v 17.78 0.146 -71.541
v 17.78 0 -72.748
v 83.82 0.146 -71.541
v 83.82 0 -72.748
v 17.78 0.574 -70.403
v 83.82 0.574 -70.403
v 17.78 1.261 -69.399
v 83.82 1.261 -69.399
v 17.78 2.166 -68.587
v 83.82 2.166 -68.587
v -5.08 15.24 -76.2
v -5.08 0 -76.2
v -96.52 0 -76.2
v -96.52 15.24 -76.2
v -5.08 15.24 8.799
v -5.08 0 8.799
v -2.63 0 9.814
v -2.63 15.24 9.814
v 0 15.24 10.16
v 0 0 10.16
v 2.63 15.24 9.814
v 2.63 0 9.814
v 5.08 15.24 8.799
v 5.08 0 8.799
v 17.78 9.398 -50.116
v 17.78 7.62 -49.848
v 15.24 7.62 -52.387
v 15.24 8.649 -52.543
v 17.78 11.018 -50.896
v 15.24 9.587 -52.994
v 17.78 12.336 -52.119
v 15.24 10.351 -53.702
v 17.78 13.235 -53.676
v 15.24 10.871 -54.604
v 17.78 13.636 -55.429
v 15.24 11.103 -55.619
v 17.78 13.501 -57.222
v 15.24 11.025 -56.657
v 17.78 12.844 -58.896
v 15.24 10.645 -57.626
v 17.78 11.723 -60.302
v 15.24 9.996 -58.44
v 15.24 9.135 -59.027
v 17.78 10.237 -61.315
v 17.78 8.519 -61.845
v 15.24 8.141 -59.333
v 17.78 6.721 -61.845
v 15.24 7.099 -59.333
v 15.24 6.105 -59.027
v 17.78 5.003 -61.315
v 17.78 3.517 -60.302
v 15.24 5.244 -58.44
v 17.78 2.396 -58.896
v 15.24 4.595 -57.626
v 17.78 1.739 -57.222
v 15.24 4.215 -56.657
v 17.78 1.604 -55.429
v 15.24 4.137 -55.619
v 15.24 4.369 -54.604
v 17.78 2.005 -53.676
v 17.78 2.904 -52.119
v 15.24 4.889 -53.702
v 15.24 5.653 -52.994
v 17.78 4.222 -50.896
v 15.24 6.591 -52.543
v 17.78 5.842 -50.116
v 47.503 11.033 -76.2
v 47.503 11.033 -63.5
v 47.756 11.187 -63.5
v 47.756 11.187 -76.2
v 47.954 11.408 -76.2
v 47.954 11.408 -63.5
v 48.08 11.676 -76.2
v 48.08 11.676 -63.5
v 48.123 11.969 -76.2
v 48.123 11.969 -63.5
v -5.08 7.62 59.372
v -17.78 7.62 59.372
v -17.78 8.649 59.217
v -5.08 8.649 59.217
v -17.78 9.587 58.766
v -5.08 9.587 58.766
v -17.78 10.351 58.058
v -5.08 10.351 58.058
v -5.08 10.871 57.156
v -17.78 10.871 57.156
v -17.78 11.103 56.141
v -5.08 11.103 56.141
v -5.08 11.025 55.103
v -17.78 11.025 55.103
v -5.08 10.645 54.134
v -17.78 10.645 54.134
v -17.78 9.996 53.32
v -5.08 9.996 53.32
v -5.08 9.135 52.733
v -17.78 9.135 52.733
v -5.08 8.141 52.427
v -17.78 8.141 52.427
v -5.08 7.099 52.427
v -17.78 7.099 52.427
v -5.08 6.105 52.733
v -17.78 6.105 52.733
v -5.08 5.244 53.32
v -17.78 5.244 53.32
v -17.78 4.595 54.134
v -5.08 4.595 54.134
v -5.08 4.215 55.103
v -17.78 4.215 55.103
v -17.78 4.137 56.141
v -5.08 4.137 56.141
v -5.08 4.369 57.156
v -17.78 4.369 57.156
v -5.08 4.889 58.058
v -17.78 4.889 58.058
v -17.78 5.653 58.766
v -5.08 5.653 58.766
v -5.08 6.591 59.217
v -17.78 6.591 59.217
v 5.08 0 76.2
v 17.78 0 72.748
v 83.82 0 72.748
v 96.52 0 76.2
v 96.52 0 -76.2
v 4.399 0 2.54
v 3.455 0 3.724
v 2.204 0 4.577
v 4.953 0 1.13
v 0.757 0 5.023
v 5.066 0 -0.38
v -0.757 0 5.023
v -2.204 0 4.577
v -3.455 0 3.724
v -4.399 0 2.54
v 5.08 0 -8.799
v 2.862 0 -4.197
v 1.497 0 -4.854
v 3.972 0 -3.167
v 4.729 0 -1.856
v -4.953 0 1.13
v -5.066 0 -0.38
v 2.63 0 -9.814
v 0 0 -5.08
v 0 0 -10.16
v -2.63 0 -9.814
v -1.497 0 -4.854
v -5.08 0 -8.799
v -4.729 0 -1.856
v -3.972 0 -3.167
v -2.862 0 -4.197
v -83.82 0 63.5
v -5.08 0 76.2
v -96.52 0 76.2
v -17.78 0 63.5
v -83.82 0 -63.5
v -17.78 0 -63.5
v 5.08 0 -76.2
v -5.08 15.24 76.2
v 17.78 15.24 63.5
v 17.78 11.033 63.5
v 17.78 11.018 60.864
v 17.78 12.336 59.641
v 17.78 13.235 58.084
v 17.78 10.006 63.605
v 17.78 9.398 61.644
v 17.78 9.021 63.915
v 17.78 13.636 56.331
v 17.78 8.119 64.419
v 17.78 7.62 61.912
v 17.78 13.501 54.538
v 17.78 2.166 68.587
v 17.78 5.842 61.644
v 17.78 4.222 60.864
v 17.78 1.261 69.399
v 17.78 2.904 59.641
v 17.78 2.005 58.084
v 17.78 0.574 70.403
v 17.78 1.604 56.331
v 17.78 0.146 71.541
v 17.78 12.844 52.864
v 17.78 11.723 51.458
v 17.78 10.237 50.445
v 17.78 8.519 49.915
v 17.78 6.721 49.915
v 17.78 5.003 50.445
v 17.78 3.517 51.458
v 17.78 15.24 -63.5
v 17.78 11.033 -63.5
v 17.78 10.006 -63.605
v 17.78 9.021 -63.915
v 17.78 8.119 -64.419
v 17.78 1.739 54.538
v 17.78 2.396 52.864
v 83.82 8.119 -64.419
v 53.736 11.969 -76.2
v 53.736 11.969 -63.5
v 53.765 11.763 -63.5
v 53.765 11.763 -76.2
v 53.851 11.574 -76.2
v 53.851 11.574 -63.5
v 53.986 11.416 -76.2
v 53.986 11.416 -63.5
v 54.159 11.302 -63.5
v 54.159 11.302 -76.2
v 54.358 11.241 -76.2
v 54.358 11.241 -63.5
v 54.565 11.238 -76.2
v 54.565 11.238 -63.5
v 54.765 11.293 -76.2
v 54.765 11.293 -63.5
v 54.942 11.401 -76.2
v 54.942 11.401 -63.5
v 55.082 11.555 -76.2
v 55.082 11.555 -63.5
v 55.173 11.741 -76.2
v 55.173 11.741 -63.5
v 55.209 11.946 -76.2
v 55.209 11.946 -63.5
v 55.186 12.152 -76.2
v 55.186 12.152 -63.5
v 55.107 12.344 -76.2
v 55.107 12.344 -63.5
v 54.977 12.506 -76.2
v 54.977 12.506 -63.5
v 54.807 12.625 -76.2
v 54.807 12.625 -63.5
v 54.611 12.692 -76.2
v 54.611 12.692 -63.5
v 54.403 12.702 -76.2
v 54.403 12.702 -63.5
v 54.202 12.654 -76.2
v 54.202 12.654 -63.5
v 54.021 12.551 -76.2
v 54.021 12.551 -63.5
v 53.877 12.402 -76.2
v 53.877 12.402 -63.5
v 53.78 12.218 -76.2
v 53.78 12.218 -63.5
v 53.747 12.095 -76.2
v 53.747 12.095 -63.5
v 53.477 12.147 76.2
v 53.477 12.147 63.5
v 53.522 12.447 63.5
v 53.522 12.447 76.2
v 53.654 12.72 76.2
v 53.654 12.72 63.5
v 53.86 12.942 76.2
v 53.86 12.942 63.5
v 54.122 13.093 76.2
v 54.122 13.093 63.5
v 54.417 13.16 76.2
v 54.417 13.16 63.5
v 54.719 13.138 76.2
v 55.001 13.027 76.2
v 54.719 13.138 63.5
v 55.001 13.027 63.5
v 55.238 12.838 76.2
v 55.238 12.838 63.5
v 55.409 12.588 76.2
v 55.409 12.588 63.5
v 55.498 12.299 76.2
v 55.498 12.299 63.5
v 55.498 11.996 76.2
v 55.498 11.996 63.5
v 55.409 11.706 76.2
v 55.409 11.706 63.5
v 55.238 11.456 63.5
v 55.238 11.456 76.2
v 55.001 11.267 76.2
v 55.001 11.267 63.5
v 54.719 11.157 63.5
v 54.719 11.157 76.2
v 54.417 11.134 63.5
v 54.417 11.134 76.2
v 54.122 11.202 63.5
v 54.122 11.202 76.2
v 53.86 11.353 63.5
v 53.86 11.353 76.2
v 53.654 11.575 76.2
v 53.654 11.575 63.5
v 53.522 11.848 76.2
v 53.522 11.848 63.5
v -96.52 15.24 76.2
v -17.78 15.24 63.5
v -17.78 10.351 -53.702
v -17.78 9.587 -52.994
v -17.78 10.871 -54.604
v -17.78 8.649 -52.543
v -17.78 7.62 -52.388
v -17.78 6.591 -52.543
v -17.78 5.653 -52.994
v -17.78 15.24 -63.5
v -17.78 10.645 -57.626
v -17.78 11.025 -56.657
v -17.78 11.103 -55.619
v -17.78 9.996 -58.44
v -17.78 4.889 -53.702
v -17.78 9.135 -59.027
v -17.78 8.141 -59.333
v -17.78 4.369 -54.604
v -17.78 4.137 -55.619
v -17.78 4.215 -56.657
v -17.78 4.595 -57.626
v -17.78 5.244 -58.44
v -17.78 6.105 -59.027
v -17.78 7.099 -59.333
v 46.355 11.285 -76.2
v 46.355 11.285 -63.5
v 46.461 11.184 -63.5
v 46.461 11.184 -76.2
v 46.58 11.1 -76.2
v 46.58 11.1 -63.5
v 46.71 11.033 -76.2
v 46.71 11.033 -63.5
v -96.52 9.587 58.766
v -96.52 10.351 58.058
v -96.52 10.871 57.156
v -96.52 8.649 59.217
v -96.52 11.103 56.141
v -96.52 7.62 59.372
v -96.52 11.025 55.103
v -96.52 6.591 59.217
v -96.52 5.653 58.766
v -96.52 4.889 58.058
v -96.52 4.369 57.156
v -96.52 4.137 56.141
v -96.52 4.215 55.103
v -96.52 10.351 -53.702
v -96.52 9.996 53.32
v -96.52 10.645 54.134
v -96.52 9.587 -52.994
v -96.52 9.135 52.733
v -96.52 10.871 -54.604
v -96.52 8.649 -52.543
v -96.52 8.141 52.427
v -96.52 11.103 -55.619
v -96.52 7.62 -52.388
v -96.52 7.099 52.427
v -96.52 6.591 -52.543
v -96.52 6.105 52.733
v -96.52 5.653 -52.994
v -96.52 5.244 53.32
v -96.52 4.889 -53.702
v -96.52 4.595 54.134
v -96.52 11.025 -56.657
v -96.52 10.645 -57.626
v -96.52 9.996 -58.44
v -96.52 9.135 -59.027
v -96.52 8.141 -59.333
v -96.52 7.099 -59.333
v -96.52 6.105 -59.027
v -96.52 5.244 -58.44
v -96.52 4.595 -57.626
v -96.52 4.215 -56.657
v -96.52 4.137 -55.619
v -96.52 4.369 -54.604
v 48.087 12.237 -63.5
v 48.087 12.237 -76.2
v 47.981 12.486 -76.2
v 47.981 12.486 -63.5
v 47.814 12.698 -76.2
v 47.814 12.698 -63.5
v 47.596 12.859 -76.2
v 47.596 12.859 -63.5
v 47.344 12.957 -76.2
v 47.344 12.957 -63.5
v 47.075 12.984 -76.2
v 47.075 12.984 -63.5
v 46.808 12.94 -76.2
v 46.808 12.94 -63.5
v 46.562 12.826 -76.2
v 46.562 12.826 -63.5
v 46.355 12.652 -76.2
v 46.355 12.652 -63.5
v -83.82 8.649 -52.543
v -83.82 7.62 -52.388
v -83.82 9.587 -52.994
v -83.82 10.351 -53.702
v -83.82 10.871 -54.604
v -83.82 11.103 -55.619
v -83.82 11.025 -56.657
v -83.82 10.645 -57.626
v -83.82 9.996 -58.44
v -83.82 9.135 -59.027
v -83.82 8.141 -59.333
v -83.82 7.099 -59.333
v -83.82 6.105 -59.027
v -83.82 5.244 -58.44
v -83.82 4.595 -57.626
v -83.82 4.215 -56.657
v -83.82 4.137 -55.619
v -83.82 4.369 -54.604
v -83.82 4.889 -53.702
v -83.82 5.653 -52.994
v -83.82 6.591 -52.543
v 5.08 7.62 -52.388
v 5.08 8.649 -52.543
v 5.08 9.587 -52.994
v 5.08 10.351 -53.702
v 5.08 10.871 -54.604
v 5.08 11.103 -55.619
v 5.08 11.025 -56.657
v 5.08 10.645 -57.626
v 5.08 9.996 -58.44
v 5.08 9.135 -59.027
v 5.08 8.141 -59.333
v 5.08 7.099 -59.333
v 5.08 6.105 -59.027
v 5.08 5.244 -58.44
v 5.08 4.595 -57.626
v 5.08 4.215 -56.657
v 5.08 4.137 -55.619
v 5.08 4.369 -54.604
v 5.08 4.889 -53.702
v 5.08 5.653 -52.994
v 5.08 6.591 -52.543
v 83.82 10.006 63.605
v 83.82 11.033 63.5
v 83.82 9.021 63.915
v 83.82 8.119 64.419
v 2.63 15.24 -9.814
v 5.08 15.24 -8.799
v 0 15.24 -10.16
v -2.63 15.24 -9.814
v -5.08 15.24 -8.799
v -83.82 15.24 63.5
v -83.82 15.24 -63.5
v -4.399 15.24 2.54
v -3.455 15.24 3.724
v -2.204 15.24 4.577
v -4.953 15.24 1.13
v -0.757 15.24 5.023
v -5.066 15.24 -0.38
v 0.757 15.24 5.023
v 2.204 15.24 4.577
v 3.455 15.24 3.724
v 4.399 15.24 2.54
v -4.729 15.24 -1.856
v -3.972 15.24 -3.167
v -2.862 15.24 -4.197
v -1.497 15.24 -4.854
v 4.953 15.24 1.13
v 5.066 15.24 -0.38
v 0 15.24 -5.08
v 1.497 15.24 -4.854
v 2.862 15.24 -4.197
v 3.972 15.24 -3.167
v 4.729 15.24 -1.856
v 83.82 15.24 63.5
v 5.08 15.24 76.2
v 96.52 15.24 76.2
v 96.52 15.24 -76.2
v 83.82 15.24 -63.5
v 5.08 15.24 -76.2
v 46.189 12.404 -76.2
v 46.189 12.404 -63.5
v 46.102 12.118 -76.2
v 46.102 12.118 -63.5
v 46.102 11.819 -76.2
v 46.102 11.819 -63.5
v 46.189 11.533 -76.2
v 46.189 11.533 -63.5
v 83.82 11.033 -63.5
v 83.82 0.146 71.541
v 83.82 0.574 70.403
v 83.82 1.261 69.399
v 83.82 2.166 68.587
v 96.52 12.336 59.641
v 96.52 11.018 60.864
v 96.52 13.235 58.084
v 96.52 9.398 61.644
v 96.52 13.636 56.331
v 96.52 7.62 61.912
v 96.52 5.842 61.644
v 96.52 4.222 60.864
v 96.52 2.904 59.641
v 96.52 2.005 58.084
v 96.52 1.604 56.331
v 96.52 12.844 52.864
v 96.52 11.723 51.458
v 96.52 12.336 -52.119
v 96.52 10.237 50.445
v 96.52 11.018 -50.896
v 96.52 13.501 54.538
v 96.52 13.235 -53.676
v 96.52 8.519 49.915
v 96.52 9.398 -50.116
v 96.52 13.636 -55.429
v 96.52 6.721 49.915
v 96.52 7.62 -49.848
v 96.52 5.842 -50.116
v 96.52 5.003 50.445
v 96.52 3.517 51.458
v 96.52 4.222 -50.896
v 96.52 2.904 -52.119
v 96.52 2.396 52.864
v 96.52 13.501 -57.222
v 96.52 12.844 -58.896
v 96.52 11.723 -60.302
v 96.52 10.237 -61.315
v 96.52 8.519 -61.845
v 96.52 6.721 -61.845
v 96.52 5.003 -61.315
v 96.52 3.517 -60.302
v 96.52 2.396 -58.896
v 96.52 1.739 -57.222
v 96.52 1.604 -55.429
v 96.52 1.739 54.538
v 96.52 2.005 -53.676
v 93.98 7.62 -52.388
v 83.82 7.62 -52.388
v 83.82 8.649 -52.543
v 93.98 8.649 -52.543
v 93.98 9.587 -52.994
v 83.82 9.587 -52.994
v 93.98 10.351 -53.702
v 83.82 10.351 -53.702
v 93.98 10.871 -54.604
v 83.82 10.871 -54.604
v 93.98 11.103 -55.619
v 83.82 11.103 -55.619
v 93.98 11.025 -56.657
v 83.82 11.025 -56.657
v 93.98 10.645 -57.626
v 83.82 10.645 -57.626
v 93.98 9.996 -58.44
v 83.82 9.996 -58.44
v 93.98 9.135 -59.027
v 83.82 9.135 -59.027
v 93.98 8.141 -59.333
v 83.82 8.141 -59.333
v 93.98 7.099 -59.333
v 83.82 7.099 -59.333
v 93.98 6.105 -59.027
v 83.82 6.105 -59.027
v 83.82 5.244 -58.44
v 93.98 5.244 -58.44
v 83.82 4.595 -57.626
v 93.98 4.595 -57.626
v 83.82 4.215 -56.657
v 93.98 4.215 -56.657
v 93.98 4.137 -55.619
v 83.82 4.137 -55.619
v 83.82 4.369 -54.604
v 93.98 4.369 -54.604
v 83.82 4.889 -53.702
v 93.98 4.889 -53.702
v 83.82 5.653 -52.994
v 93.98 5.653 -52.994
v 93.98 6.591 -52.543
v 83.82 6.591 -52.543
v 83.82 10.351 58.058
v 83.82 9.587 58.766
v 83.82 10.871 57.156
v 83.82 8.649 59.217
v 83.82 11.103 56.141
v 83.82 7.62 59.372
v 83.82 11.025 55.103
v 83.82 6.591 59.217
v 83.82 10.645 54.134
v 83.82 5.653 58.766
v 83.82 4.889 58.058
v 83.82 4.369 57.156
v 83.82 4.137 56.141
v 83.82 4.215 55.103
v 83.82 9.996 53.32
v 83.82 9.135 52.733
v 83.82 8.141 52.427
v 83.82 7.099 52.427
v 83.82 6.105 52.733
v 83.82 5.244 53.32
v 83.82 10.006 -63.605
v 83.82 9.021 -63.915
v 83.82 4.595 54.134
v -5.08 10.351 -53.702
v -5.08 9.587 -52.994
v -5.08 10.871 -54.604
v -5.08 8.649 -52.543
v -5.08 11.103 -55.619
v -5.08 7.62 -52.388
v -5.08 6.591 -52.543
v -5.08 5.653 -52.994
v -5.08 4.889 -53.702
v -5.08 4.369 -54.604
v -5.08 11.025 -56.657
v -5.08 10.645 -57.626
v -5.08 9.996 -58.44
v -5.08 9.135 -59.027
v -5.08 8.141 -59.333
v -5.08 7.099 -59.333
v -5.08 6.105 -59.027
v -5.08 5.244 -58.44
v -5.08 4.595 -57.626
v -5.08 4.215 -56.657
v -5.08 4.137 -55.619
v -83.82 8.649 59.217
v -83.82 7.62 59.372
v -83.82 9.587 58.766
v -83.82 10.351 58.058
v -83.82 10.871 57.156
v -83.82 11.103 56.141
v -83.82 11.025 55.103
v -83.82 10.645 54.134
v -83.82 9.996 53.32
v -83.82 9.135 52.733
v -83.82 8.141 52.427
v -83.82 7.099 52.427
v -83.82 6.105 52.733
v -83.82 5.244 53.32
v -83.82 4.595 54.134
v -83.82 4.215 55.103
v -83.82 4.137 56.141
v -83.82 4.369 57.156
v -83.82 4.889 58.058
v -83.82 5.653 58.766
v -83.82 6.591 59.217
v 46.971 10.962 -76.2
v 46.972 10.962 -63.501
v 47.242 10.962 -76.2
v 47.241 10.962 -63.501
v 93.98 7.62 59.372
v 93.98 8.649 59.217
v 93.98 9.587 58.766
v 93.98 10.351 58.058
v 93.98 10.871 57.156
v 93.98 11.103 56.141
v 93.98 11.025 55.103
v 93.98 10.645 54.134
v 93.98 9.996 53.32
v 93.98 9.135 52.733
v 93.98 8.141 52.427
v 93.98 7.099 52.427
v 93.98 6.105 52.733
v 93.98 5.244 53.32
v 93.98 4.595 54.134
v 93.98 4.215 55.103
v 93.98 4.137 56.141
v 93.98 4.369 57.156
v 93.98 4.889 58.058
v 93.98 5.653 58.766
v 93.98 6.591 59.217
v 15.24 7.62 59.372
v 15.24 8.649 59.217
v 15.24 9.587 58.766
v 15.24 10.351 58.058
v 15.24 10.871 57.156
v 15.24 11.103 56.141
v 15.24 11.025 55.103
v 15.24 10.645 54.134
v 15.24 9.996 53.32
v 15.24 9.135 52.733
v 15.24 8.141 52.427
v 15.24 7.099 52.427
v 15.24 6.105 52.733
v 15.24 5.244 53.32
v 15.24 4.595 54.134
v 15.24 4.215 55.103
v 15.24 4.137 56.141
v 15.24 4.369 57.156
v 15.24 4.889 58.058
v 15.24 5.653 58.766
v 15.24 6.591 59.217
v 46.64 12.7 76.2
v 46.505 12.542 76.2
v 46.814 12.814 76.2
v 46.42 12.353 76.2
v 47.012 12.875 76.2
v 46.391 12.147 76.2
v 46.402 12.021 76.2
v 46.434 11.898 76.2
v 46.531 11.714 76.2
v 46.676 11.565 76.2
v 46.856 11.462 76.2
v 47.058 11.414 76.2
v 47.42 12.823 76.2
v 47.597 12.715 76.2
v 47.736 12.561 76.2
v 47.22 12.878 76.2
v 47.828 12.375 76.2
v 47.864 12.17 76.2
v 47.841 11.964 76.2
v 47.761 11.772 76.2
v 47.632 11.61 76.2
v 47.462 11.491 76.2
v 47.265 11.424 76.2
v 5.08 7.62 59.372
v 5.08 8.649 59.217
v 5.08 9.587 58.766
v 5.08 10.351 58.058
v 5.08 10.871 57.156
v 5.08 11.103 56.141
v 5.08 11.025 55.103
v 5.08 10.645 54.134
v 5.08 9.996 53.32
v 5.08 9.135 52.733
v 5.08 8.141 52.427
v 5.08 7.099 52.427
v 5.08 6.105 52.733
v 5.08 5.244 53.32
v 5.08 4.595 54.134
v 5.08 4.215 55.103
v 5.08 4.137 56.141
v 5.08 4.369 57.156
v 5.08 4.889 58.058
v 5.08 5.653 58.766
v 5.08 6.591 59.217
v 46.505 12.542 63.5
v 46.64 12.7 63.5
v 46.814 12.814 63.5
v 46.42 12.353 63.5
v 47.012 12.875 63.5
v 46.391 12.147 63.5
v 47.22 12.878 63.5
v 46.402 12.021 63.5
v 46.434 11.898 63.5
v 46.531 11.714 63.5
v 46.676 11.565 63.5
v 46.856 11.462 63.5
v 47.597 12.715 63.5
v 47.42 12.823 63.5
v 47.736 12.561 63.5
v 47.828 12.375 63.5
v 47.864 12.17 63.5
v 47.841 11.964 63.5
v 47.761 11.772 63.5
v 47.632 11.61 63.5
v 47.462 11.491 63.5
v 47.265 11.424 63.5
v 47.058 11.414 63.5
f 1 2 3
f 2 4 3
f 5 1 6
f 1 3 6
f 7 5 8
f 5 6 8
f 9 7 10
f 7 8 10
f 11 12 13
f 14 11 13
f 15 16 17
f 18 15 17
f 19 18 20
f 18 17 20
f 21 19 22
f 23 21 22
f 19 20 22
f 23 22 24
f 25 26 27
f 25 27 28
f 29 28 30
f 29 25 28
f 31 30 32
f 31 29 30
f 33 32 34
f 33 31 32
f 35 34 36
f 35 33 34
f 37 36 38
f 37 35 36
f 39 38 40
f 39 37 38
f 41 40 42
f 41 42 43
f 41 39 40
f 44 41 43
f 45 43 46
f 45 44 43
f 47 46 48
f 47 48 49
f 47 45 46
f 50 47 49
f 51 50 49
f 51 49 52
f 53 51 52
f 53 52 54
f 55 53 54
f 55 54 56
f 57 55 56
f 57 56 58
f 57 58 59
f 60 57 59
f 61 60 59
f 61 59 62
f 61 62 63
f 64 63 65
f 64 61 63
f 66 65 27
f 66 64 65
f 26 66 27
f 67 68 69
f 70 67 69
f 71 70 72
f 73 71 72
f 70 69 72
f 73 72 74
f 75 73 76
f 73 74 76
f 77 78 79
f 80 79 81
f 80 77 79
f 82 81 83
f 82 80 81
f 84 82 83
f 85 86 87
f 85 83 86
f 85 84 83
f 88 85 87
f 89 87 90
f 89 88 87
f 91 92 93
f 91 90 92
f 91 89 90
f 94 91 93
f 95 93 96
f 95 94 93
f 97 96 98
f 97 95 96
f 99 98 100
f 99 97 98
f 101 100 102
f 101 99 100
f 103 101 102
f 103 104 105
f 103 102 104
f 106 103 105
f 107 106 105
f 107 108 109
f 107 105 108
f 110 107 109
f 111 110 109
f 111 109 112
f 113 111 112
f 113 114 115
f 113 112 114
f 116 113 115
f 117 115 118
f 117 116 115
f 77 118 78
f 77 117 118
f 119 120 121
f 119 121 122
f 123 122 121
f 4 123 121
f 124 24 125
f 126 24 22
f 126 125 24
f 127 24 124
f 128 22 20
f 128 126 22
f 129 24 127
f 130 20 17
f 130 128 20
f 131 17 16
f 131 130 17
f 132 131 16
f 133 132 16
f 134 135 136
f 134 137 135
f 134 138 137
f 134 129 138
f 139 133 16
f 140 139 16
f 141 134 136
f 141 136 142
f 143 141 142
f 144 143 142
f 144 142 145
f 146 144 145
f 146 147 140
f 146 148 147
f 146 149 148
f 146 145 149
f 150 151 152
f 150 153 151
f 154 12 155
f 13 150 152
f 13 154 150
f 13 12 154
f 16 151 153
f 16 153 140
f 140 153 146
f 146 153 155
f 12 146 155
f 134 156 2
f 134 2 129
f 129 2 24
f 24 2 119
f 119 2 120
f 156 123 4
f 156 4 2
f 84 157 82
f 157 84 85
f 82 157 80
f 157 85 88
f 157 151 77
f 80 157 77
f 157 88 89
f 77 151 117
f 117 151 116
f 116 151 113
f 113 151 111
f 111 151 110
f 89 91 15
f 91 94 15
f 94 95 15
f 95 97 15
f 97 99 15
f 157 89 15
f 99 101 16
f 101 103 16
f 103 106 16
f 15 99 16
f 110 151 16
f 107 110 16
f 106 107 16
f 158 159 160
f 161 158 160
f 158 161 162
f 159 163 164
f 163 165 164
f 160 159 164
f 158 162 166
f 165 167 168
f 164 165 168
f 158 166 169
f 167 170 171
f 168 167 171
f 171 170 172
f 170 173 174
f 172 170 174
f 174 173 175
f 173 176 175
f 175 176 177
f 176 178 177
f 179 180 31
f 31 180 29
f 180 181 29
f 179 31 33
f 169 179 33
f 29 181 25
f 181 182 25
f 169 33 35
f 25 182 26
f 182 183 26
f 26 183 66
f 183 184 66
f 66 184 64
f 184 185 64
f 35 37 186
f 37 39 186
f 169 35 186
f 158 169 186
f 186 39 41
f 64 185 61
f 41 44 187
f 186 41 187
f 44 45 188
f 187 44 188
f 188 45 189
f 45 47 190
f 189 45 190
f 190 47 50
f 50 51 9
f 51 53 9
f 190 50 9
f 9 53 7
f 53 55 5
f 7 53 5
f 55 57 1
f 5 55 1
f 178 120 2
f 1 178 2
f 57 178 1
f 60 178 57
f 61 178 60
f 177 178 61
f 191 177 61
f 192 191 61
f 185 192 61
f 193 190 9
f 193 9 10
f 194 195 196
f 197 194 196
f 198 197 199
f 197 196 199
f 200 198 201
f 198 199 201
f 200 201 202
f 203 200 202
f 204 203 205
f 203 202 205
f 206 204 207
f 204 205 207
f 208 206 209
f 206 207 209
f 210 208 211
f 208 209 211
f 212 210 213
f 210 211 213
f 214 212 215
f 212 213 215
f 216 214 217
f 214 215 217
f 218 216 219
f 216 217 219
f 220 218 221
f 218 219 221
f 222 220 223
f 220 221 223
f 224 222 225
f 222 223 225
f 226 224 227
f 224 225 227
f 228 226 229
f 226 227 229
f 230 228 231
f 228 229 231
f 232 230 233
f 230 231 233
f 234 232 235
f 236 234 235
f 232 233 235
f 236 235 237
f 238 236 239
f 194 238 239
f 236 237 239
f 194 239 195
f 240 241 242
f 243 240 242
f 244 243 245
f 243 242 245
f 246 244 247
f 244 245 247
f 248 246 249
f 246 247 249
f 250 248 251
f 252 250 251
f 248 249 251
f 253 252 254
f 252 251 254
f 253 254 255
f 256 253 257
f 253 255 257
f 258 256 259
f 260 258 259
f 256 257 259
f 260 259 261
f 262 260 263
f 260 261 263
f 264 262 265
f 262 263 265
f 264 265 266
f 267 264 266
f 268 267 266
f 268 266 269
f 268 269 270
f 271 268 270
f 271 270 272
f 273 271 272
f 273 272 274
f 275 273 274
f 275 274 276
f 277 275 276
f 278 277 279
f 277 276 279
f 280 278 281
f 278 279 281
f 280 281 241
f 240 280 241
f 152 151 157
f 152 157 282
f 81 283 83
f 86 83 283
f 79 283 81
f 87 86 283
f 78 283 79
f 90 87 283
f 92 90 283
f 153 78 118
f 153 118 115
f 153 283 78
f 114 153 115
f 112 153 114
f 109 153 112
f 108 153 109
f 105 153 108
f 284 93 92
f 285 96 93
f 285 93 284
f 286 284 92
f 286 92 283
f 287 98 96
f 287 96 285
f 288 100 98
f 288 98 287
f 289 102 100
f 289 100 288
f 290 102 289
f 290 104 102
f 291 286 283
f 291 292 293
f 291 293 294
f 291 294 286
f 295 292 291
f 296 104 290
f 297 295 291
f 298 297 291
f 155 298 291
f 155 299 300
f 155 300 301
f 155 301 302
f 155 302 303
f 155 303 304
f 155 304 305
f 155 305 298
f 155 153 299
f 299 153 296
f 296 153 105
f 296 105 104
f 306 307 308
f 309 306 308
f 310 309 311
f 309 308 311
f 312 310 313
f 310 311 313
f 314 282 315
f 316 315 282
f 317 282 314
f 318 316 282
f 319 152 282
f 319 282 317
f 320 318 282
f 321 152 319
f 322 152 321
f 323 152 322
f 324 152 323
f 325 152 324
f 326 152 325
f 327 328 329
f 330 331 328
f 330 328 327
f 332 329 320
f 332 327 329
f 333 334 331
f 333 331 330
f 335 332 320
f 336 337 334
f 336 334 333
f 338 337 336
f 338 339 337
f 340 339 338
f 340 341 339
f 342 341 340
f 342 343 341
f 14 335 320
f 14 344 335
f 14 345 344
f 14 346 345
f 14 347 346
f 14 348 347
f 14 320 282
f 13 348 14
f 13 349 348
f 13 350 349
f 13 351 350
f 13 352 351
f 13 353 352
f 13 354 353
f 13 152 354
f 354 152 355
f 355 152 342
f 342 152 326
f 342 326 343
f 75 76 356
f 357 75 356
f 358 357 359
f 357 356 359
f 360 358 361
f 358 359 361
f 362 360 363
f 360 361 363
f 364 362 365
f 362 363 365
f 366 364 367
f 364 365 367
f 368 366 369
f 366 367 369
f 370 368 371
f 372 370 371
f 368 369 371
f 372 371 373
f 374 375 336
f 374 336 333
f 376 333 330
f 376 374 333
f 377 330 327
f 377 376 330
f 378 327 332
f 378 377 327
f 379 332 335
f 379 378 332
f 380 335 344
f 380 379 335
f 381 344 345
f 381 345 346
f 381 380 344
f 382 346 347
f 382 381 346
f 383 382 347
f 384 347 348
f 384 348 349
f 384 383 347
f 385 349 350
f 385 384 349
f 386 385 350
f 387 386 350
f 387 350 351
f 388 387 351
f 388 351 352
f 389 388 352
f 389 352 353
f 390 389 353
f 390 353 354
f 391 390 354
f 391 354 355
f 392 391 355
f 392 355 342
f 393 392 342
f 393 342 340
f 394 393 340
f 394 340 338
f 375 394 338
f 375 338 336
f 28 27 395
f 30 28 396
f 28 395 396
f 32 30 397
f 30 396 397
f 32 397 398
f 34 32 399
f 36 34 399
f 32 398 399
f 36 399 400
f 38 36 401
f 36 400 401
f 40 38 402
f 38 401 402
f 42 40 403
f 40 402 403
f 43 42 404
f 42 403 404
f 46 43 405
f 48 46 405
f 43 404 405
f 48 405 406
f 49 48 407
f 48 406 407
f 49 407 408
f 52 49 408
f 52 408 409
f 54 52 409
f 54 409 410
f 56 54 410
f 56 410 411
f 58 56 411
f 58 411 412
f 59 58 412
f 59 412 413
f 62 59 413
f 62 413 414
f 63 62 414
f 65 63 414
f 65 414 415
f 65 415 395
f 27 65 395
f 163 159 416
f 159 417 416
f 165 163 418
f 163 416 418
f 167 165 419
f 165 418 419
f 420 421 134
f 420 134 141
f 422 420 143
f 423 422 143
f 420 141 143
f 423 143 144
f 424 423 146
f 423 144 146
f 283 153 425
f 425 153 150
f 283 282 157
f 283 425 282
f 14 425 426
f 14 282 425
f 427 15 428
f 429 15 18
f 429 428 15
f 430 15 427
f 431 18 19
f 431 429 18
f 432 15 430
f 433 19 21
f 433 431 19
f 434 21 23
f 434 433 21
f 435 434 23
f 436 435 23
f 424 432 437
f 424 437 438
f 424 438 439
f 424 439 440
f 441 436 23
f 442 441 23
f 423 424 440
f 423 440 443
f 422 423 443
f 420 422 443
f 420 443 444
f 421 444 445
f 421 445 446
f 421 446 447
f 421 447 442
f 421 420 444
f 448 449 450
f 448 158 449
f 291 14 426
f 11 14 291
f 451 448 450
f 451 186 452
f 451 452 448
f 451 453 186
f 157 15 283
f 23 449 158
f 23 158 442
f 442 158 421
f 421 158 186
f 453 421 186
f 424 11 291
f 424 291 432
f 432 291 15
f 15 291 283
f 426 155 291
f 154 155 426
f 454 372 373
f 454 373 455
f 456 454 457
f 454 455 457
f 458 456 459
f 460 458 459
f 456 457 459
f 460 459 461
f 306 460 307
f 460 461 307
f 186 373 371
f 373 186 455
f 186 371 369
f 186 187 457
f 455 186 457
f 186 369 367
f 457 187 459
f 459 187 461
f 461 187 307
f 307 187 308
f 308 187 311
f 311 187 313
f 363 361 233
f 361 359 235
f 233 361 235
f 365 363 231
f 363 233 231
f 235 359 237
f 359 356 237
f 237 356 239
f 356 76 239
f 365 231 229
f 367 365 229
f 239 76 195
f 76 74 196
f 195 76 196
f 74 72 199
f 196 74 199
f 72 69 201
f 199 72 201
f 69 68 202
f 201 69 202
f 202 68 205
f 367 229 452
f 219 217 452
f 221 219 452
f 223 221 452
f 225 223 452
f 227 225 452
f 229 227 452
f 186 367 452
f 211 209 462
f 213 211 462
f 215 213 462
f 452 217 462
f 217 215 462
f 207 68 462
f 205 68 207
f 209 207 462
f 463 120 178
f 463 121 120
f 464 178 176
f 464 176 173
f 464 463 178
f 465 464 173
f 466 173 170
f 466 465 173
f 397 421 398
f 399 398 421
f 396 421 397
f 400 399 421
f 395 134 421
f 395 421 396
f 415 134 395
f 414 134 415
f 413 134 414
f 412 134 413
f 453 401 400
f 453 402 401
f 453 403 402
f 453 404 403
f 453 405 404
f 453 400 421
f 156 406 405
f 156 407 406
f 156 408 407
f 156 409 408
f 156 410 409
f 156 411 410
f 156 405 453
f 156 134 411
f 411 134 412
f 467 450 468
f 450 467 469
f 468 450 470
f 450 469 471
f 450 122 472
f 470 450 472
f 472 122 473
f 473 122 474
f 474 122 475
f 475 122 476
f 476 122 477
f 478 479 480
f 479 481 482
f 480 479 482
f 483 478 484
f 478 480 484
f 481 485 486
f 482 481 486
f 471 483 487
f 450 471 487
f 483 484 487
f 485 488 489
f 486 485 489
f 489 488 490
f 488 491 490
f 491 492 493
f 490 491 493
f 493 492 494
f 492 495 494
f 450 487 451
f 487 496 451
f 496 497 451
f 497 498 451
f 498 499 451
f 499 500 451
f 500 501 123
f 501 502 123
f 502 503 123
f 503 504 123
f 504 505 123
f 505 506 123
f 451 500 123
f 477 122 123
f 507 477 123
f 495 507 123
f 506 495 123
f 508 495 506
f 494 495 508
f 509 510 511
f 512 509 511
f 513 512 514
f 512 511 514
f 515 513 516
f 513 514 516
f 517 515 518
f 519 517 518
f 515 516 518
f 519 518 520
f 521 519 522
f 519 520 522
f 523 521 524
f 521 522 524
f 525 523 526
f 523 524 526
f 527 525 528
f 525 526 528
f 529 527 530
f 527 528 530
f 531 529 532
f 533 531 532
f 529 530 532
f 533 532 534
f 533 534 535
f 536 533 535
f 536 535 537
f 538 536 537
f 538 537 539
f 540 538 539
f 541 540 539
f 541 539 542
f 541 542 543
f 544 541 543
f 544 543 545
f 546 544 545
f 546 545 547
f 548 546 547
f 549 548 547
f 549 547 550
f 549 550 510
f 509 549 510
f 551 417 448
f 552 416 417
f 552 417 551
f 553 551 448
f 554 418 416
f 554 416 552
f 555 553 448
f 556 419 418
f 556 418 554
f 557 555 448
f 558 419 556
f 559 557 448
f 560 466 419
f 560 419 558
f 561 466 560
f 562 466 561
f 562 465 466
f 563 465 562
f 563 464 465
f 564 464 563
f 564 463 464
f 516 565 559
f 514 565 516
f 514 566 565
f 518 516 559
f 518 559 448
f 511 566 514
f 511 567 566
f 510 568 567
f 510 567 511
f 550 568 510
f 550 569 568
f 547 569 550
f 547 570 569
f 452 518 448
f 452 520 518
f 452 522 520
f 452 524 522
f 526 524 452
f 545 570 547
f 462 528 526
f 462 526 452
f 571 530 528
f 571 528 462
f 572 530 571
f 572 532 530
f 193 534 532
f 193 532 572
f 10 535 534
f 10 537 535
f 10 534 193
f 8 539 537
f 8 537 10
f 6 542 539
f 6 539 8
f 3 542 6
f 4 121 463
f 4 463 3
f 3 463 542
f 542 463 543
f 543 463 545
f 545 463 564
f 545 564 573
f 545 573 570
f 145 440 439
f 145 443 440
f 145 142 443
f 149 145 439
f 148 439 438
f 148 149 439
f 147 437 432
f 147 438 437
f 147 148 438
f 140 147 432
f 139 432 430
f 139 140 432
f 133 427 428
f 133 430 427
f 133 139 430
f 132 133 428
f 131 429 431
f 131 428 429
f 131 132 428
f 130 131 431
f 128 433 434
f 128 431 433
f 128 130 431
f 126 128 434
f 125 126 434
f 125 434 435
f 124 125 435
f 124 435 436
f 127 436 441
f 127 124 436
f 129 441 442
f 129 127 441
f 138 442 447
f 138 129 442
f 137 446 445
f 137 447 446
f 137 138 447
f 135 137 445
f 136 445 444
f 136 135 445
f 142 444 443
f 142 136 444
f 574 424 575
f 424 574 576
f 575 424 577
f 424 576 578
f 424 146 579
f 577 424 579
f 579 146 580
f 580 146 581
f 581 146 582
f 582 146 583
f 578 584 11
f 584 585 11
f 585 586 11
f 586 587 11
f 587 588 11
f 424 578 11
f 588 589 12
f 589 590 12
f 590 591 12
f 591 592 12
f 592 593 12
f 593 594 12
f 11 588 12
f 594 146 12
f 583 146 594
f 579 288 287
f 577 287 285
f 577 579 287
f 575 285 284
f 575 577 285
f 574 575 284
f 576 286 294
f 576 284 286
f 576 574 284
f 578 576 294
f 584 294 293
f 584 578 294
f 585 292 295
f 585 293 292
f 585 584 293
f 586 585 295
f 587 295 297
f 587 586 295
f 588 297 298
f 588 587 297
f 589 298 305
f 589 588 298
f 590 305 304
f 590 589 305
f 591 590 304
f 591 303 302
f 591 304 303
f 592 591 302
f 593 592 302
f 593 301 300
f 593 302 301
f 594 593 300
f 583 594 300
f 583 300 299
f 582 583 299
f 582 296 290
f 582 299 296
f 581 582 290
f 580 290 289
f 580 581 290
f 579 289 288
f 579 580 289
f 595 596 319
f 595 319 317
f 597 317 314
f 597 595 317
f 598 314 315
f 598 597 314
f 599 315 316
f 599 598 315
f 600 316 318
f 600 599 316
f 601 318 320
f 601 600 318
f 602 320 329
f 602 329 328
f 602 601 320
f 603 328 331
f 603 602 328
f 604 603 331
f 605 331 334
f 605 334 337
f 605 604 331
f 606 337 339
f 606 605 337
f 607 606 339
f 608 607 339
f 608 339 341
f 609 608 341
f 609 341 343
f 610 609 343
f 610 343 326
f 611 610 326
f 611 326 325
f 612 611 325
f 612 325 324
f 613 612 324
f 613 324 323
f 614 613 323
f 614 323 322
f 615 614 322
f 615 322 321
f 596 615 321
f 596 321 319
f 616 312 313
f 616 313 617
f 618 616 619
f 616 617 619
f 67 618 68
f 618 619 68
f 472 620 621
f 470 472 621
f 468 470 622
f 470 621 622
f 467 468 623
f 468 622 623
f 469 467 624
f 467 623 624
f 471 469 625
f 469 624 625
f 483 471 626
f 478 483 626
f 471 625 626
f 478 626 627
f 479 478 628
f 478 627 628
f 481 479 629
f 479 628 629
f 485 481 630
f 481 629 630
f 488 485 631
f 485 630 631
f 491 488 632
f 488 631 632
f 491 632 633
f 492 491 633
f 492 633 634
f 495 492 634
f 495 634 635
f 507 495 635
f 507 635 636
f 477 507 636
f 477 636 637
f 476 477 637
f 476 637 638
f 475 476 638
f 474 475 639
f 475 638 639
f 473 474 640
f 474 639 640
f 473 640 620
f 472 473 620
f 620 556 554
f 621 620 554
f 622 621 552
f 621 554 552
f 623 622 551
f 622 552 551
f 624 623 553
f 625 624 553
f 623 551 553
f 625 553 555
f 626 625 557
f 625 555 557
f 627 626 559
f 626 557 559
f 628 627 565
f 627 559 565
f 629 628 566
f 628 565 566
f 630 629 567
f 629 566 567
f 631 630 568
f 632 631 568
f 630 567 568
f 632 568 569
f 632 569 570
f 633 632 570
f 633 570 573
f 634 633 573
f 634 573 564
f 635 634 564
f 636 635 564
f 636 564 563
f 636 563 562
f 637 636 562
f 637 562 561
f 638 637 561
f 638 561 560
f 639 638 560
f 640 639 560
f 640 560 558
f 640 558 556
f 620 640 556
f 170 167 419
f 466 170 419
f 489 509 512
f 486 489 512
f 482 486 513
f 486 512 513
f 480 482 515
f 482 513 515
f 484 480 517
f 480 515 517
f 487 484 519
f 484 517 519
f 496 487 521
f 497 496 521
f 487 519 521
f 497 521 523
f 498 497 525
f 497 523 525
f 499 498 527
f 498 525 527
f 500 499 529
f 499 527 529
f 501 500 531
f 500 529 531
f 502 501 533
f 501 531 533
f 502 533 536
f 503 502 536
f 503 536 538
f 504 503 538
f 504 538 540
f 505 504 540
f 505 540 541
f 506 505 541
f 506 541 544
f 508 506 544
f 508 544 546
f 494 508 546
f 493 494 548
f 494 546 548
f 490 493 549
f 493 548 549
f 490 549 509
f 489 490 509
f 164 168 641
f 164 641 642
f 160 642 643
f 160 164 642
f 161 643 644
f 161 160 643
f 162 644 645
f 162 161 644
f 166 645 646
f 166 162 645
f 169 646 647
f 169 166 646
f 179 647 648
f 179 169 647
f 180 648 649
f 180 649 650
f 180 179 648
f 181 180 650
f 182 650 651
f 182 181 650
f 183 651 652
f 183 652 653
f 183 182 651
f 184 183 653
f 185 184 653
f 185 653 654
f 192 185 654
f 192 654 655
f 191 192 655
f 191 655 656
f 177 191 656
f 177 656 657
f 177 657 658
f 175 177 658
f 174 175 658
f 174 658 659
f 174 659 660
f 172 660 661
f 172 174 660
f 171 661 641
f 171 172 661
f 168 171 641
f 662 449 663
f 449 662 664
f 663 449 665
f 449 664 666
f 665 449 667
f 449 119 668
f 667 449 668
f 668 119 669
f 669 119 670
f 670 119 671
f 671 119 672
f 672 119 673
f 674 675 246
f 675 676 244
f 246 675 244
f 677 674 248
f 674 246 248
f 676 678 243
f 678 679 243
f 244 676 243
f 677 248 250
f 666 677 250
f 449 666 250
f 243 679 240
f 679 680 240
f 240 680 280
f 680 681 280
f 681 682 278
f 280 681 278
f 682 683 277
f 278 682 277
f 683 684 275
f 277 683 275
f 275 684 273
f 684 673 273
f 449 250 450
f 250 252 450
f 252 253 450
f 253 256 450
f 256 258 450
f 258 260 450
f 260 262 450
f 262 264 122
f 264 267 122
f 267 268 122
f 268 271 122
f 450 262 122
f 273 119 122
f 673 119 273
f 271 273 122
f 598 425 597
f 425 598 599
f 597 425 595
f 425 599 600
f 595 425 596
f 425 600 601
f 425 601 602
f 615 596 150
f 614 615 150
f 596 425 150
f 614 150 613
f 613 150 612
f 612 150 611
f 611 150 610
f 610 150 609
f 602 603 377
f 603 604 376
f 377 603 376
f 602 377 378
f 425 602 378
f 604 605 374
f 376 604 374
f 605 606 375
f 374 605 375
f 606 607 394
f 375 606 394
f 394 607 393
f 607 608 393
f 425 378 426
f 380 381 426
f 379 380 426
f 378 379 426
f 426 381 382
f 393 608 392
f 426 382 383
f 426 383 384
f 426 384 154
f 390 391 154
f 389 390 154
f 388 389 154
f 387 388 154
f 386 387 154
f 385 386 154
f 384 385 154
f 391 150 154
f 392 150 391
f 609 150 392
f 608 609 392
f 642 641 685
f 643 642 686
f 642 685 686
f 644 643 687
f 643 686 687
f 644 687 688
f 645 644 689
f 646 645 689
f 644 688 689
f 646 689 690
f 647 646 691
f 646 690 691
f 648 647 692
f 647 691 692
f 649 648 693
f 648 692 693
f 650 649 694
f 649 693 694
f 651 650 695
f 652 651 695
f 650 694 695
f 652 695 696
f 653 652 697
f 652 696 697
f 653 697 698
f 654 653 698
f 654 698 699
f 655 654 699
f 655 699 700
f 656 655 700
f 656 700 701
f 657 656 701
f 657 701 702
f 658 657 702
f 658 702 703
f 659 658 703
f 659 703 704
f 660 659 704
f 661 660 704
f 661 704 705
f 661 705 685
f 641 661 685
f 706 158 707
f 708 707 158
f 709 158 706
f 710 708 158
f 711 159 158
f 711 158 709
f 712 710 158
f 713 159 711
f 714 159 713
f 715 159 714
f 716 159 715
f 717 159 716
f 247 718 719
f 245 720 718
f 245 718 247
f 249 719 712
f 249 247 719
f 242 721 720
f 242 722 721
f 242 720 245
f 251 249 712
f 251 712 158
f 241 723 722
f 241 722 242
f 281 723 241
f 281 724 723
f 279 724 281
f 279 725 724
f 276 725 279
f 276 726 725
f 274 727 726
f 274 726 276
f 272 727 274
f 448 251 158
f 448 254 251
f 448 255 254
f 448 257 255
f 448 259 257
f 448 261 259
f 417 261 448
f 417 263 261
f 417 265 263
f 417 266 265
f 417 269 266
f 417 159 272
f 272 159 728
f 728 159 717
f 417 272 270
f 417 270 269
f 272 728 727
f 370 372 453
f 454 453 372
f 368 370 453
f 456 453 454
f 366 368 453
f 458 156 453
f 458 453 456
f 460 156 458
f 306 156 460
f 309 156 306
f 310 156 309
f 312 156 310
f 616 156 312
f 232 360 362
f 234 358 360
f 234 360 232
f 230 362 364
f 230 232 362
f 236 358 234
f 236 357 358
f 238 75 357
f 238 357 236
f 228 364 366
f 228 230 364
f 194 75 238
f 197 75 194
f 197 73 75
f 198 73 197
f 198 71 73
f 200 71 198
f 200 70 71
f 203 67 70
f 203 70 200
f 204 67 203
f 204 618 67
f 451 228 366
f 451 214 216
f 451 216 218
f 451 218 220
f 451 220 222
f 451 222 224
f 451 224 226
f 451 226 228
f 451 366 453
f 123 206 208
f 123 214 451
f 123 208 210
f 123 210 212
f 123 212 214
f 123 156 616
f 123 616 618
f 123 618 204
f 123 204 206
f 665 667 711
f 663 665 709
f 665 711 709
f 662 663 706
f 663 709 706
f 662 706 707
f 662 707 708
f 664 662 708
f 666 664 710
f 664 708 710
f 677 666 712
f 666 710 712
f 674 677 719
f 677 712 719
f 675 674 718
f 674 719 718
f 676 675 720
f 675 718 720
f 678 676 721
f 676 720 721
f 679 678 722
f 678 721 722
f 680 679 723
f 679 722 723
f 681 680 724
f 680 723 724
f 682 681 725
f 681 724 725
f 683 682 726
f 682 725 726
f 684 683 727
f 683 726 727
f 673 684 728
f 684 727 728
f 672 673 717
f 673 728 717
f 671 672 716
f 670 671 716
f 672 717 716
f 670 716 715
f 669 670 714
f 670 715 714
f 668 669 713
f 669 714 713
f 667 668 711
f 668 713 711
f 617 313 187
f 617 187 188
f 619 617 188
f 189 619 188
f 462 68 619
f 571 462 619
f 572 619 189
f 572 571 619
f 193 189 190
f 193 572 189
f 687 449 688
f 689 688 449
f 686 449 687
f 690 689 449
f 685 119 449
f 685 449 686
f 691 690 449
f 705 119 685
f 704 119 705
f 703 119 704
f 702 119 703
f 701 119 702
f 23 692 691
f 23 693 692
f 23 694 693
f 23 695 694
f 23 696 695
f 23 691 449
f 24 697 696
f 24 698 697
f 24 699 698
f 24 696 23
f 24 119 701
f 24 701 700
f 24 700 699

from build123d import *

# Parameters (mm, degrees)
SKETCH3_R           = 10.16
SKETCH3_R_2         = 5.08
SKETCH3_W           = 91.44
SKETCH3_H           = 152.4
SKETCH3_W_2         = 66.04
SKETCH3_H_2         = 127
BOSS_EXTRUDE1_DEPTH = 15.24
CUT_EXTRUDE1_REACH  = 122
SKETCH4_R           = 3.4925
CHAMFER1_SIZE       = 6.604
CHAMFER1_SIZE2      = 9.431489437
CHAMFER2_SIZE       = 2.54
FILLET1_R           = 5.08
SKETCH5_RX          = 0.7366
SKETCH5_RY          = 0.736599138
CUT_EXTRUDE2_DEPTH  = 12.7
SKETCH6_R           = 1.015962928
SKETCH6_RX          = 0.7366
SKETCH6_RY          = 0.736573123
CUT_EXTRUDE3_DEPTH  = 12.7


with BuildPart() as part:
    # Sketch3 → Boss-Extrude1 (new body)
    # profile 1 of 2: a face of its own
    with BuildSketch(Plane(origin=(0, 0, 0), x_dir=(1, 0, 0), z_dir=(0, 1, 0))):
        Circle(SKETCH3_R)
        with Locations(Location((0, 0, 0), (0, 0, 90))):
            Circle(SKETCH3_R_2, mode=Mode.SUBTRACT)
    # profile 2 of 2: a face of its own
    with BuildSketch(Plane(origin=(0, 0, 0), x_dir=(1, 0, 0), z_dir=(0, 1, 0))):
        with Locations((50.8, 0)):
            Rectangle(SKETCH3_W, SKETCH3_H)
        with Locations((50.8, 0)):
            Rectangle(SKETCH3_W_2, SKETCH3_H_2, mode=Mode.SUBTRACT)
    boss_extrude1 = extrude(amount=BOSS_EXTRUDE1_DEPTH)

    # Cut-Extrude1: up to this face of the body (flat: up to its plane)
    cut_extrude1_end = Plane(part.part.faces().sort_by_distance((96.52, 7.62, 0))[0])
    # Sketch4 → Cut-Extrude1 (cut, up to the picked face)
    with BuildSketch(Plane.ZY.offset(-5.08), mode=Mode.PRIVATE) as cut_extrude1_sk1:
        with Locations((-55.88, 7.62)):
            Circle(SKETCH4_R)
    cut_extrude1_tool1 = split(extrude(cut_extrude1_sk1.sketch, amount=-CUT_EXTRUDE1_REACH, mode=Mode.PRIVATE), bisect_by=cut_extrude1_end, keep=Keep.BOTH, mode=Mode.PRIVATE)
    # Sketch4 → Cut-Extrude1 (cut, up to the picked face)
    with BuildSketch(Plane.ZY.offset(-5.08), mode=Mode.PRIVATE) as cut_extrude1_sk2:
        with Locations((55.88, 7.62)):
            Circle(SKETCH4_R)
    cut_extrude1_tool2 = split(extrude(cut_extrude1_sk2.sketch, amount=-CUT_EXTRUDE1_REACH, mode=Mode.PRIVATE), bisect_by=cut_extrude1_end, keep=Keep.BOTH, mode=Mode.PRIVATE)
    cut_extrude1_1 = cut_extrude1_tool1.solids().sort_by(Axis((5.08, 7.62, -55.88), (1, 0, 0)))[0]
    add(cut_extrude1_1, mode=Mode.SUBTRACT)
    cut_extrude1_2 = cut_extrude1_tool2.solids().sort_by(Axis((5.08, 7.62, 55.88), (1, 0, 0)))[0]
    add(cut_extrude1_2, mode=Mode.SUBTRACT)
    cut_extrude1 = cut_extrude1_1 + cut_extrude1_2  # Cut-Extrude1 as one shape, for the pattern or mirror that repeats it

    # Chamfer1
    chamfer1_edges = [part.edges().sort_by_distance(p)[0] for p in [
        (50.8, 0, -63.5),
        (50.8, 0, 63.5),
    ]]
    chamfer1_side = [part.faces().sort_by_distance(p)[0] for p in [
        (94.659720924, 0, 0),
    ]]
    chamfer(chamfer1_edges, length=CHAMFER1_SIZE, length2=CHAMFER1_SIZE2, reference=chamfer1_side[0])

    # Chamfer2
    chamfer2_edges = [part.edges().sort_by_distance(p)[0] for p in [
        (96.52, 7.62, -59.3725),
        (17.78, 7.62, -59.3725),
        (96.52, 7.62, 52.3875),
        (17.78, 7.62, 52.3875),
    ]]
    chamfer(chamfer2_edges, length=CHAMFER2_SIZE)

    # Fillet1
    fillet1_edges = [part.edges().sort_by_distance(p)[0] for p in [
        (50.8, 9.431489437, 63.5),
        (50.8, 0, -70.104),
        (50.8, 0, 70.104),
        (50.8, 9.431489437, -63.5),
    ]]
    fillet(fillet1_edges, radius=FILLET1_R)

    # Sketch5 → Cut-Extrude2 (cut)
    with BuildSketch(Plane.XY.offset(-63.5)):
        with BuildLine():
            ThreePointArc((47.502994006, 11.033207367), (47.953744135, 11.407651091), (48.122732414, 11.968745328))
            ThreePointArc((48.122732414, 11.968745328), (47.473130673, 12.916377519), (46.355000482, 12.652229708))
            ThreePointArc((46.355000482, 12.652229708), (46.090734793, 11.968745328), (46.355000482, 11.285260949))
            ThreePointArc((46.355000482, 11.285260949), (46.519064449, 11.139951899), (46.710473201, 11.033207367))
            Line((46.710473165, 11.033207284), (47.502994041, 11.033207284))
        make_face()
        with BuildLine():
            ThreePointArc((46.710473201, 11.033207367), (47.106733603, 10.952746518), (47.502994006, 11.033207367))
            Line((47.502994041, 11.033207284), (46.710473165, 11.033207284))
        make_face()
        with Locations(Location((54.472733603, 11.968745328), (0, 0, -180))):
            Ellipse(SKETCH5_RX, SKETCH5_RY)
    extrude(amount=-CUT_EXTRUDE2_DEPTH, mode=Mode.SUBTRACT)

    # Sketch6 → Cut-Extrude3 (cut)
    with BuildSketch(Plane(origin=(0, 0, 63.5), x_dir=(-1, 0, 0), z_dir=(0, 0, -1))):
        with Locations((-54.493266397, 12.147267432)):
            Circle(SKETCH6_R)
        with Locations(Location((-47.127266397, 12.147267432), (0, 0, 0))):
            Ellipse(SKETCH6_RX, SKETCH6_RY)
    extrude(amount=-CUT_EXTRUDE3_DEPTH, mode=Mode.SUBTRACT)

    # Mirror1: Boss-Extrude1, Cut-Extrude1 across plane
    add(boss_extrude1.mirror(Plane(origin=(0, 0, 0), x_dir=(0, 0, 1), z_dir=(1, 0, 0))))
    add(cut_extrude1.mirror(Plane(origin=(0, 0, 0), x_dir=(0, 0, 1), z_dir=(1, 0, 0))), mode=Mode.SUBTRACT)


solid = part.part
